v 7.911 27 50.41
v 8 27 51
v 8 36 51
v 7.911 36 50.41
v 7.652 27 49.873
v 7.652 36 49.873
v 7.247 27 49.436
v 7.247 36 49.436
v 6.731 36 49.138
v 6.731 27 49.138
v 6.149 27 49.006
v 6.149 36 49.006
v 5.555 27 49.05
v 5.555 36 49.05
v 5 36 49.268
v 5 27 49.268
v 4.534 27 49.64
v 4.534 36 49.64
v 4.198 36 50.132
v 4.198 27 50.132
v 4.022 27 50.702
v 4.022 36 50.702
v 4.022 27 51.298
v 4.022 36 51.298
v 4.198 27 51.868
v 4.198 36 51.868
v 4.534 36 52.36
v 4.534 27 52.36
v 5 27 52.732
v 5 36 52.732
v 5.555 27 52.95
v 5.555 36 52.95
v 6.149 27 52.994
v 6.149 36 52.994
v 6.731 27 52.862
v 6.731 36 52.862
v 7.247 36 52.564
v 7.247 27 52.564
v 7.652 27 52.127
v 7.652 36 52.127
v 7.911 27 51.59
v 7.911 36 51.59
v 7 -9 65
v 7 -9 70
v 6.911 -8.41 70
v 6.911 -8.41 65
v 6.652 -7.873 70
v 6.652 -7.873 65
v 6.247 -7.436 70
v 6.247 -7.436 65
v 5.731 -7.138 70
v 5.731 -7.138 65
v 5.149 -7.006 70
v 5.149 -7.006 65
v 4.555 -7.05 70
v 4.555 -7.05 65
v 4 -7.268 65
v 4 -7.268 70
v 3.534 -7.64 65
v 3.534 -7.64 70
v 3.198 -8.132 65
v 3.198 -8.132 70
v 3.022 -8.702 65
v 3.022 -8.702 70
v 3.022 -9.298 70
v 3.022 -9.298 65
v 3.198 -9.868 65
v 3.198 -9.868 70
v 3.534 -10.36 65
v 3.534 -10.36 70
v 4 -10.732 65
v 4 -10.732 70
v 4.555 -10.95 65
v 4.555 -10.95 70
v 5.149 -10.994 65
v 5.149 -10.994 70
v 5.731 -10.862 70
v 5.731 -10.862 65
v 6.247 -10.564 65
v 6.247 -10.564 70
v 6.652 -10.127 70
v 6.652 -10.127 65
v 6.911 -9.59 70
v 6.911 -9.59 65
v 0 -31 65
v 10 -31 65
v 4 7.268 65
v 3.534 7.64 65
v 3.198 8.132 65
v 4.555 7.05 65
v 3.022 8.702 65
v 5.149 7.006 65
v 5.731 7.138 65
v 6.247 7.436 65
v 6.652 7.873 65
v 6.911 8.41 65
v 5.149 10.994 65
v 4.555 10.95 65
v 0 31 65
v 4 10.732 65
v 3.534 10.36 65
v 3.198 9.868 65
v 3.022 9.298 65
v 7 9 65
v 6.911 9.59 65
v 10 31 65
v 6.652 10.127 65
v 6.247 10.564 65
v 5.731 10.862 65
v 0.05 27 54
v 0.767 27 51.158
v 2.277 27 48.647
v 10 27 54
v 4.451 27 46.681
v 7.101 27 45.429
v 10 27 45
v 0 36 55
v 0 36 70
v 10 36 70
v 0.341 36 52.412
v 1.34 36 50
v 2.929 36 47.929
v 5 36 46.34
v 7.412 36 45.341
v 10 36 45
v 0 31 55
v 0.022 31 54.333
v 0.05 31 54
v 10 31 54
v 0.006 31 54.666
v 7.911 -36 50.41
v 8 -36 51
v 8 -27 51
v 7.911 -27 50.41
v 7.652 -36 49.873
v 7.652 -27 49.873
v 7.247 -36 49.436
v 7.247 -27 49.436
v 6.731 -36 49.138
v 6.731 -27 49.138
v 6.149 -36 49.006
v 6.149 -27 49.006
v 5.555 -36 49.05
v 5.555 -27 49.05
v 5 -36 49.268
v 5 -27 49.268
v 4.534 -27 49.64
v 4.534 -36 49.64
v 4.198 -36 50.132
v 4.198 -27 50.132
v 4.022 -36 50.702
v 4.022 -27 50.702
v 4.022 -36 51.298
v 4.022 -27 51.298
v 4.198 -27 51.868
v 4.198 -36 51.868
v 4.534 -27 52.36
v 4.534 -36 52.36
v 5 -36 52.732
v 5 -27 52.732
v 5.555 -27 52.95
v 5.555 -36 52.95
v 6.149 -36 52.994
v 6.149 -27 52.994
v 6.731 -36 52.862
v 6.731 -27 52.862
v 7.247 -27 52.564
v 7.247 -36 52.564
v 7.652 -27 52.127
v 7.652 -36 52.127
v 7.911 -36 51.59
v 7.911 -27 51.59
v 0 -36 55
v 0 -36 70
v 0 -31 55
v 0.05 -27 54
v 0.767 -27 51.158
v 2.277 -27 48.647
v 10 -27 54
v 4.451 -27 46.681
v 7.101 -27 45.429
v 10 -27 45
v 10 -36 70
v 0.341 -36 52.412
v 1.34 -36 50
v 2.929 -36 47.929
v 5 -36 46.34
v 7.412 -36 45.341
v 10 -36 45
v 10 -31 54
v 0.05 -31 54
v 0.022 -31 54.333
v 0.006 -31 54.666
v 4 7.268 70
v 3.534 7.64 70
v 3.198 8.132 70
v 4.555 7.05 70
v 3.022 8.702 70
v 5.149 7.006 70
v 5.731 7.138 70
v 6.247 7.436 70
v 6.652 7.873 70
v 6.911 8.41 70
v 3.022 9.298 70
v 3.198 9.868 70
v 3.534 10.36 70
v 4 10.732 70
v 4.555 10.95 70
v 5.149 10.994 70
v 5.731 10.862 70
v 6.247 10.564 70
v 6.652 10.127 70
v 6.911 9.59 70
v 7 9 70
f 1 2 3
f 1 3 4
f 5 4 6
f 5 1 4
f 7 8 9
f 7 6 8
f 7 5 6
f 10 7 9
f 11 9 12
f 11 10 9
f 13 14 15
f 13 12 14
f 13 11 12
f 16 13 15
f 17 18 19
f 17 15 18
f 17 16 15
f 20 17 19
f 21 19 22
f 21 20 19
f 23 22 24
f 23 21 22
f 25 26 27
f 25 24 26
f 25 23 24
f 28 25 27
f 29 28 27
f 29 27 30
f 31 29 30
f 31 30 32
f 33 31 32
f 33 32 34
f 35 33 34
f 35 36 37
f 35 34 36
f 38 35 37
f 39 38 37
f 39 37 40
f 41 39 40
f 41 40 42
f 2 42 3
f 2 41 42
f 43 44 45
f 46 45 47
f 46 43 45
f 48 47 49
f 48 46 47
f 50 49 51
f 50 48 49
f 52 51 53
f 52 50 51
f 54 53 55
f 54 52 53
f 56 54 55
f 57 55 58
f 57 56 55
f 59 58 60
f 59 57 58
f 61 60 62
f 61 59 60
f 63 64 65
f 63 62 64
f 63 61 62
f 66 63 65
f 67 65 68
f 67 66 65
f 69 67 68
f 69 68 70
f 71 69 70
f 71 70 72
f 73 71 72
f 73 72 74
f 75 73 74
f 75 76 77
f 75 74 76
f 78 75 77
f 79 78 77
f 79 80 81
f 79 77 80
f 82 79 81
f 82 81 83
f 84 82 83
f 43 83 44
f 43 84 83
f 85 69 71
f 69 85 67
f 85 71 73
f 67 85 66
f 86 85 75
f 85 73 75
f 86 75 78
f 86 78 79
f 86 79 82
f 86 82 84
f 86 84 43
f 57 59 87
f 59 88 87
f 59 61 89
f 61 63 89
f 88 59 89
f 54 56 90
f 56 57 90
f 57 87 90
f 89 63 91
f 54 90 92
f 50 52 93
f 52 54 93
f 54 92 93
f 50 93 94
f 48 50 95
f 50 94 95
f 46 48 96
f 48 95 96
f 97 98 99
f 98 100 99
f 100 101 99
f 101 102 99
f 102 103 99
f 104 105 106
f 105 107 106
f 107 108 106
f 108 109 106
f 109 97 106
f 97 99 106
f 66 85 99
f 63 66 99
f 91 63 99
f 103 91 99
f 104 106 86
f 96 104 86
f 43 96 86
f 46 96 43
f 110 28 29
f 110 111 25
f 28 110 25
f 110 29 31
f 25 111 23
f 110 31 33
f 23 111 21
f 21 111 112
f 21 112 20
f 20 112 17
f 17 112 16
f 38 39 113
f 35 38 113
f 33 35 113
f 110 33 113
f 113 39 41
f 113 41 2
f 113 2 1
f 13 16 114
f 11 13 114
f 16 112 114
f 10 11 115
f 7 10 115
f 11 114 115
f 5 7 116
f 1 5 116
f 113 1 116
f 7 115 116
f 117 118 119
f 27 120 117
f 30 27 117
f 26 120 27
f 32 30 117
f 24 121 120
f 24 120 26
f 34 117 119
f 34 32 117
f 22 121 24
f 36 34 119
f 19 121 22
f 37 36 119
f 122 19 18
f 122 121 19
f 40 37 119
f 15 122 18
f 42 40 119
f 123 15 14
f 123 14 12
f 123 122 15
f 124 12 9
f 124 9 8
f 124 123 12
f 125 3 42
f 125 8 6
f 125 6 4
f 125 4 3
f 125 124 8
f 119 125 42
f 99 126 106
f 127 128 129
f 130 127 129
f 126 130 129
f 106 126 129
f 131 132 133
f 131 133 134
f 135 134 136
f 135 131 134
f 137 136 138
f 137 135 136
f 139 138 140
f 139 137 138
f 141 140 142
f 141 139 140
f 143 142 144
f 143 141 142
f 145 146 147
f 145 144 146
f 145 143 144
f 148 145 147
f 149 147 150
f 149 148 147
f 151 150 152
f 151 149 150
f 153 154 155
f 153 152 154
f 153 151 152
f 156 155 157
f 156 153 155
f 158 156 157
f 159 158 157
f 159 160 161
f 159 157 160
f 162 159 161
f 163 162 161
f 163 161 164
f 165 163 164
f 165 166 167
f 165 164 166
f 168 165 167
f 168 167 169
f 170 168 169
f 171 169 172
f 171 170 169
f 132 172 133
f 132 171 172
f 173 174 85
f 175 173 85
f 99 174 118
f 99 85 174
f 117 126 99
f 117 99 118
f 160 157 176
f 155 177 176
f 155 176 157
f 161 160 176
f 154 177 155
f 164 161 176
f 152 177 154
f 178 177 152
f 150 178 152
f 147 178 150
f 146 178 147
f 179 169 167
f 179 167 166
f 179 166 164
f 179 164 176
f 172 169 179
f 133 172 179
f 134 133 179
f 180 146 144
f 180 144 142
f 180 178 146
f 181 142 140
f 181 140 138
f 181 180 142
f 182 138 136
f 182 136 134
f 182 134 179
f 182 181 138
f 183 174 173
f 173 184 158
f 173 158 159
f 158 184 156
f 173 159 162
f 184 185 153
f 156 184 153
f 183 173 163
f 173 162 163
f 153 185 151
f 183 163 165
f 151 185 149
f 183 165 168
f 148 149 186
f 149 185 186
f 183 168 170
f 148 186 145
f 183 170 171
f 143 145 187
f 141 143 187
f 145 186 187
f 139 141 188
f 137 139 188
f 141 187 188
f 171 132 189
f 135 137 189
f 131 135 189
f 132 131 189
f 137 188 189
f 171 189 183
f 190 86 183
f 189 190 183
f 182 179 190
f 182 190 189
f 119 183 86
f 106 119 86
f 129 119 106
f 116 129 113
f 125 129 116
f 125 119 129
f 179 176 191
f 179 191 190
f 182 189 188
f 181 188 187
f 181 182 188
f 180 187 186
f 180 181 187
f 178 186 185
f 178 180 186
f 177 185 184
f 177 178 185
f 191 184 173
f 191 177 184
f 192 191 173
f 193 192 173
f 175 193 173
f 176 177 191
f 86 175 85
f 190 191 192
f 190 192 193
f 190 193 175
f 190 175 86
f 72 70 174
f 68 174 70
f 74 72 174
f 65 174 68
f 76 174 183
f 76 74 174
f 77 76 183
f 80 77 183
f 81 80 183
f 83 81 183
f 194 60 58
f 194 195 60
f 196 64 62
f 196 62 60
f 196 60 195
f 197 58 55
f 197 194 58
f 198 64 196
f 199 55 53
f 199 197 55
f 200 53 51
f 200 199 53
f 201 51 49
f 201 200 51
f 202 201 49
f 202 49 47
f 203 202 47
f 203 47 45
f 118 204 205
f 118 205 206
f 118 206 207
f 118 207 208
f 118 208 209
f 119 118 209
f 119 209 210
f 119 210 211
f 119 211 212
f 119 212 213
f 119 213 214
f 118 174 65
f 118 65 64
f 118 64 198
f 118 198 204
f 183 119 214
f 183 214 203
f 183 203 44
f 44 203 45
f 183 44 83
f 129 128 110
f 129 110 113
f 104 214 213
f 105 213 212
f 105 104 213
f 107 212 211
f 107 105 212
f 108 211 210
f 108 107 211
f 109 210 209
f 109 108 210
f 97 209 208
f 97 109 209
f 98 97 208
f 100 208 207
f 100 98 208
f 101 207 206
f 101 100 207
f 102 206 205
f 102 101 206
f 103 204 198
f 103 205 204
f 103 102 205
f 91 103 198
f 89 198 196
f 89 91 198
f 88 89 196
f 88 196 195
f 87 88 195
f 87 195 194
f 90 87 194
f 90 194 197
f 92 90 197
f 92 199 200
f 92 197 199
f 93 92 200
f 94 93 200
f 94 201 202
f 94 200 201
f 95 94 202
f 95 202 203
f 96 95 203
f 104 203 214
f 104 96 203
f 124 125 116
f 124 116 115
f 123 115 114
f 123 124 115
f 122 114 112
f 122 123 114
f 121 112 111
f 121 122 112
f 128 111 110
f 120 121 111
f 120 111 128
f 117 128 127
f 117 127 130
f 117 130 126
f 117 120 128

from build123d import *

# Parameters (mm, degrees)
CYLINDER016_R     = 2
CYLINDER016_DEPTH = 94
CYLINDER030_R     = 2
CYLINDER030_DEPTH = 10
CYLINDER029_R     = 2
CYLINDER029_DEPTH = 10
CYLINDER001_W     = 10
CYLINDER001_H     = 5
CYLINDER001_ANGLE = 90
BOX002_W          = 10
BOX002_H          = 54
BOX002_DEPTH      = 11
BOX001_W          = 10
BOX001_H          = 62
BOX001_DEPTH      = 11
BOX_W             = 10
BOX_H             = 72
BOX_DEPTH         = 25
CYLINDER_W        = 10
CYLINDER_H        = 5
CYLINDER_ANGLE    = 90
CYLINDER017_W     = 10
CYLINDER017_H     = 87
CYLINDER017_ANGLE = 90
BOX004_W          = 25
BOX004_H          = 72
BOX004_DEPTH      = 15


with BuildPart() as m3heastsetcut:
    # Cylinder016 → Cylinder016 (new body)
    with BuildSketch(Plane(origin=(6, -47.35, 51), x_dir=(1, 0, 0), z_dir=(0, 1, 0))):
        Circle(CYLINDER016_R)
    extrude(amount=CYLINDER016_DEPTH)


with BuildPart() as m3cuts003:
    # Cylinder030 → Cylinder030 (new body)
    with BuildSketch(Plane(origin=(5, 9, 70), x_dir=(1, 0, 0), z_dir=(0, 0, 1))):
        Circle(CYLINDER030_R)
    extrude(amount=CYLINDER030_DEPTH)


with BuildPart() as m3cute001:
    # Cylinder029 → Cylinder029 (new body)
    with BuildSketch(Plane(origin=(5, -9, 70), x_dir=(1, 0, 0), z_dir=(0, 0, 1))):
        Circle(CYLINDER029_R)
    extrude(amount=CYLINDER029_DEPTH)

    # Fusion012: union m3Cuts003
    add(m3cuts003.part)


with BuildPart() as m3cute001_1:
    # Fusion012 placement: moved
    add(m3cute001.part.moved(Location((0, 0, -5))))


with BuildPart() as cylinder001:
    # Cylinder001 → Cylinder001 (revolve)
    with BuildSketch(Plane(origin=(10, -31, 55), x_dir=(-1, 0, 0), z_dir=(0, 0, 1))):
        with Locations((5, 2.5)):
            Rectangle(CYLINDER001_W, CYLINDER001_H)
    revolve(axis=Axis((10, -31, 55), (0, -1, 0)), revolution_arc=CYLINDER001_ANGLE)


with BuildPart() as in001:
    # Box002 → Box002 (new body)
    with BuildSketch(Plane(origin=(0, -27, 45), x_dir=(1, 0, 0), z_dir=(0, 0, 1))):
        with Locations((5, 27)):
            Rectangle(BOX002_W, BOX002_H)
    extrude(amount=BOX002_DEPTH)


with BuildPart() as in002:
    # Box001 → Box001 (new body)
    with BuildSketch(Plane(origin=(0, -31, 54), x_dir=(1, 0, 0), z_dir=(0, 0, 1))):
        with Locations((5, 31)):
            Rectangle(BOX001_W, BOX001_H)
    extrude(amount=BOX001_DEPTH)

    # Fusion: union in001
    add(in001.part)


with BuildPart() as cut:
    # Box → Box (new body)
    with BuildSketch(Plane(origin=(0, -36, 45), x_dir=(1, 0, 0), z_dir=(0, 0, 1))):
        with Locations((5, 36)):
            Rectangle(BOX_W, BOX_H)
    extrude(amount=BOX_DEPTH)

    # Cut: cut in002
    add(in002.part, mode=Mode.SUBTRACT)


with BuildPart() as lowbase:
    # Cylinder → Cylinder (revolve)
    with BuildSketch(Plane(origin=(10, 31, 55), x_dir=(0, 0, -1), z_dir=(1, 0, 0))):
        with Locations((5, 2.5)):
            Rectangle(CYLINDER_W, CYLINDER_H)
    revolve(axis=Axis((10, 31, 55), (0, 1, 0)), revolution_arc=CYLINDER_ANGLE)

    # Fusion001: union Cylinder001, Cut
    add(cylinder001.part)
    add(cut.part)

    # Cut003: cut m3Cute001
    add(m3cute001_1.part, mode=Mode.SUBTRACT)

    # Cut004: cut m3HeastSetCut
    add(m3heastsetcut.part, mode=Mode.SUBTRACT)


with BuildPart() as include001:
    # Cylinder017 → Cylinder017 (revolve)
    with BuildSketch(Plane(origin=(10, -40.75, 55), x_dir=(0, 0, -1), z_dir=(1, 0, 0))):
        with Locations((5, 43.5)):
            Rectangle(CYLINDER017_W, CYLINDER017_H)
    revolve(axis=Axis((10, -40.75, 55), (0, 1, 0)), revolution_arc=CYLINDER017_ANGLE)


with BuildPart() as common:
    # Box004 → Box004 (new body)
    with BuildSketch(Plane(origin=(-15, -36, 55), x_dir=(1, 0, 0), z_dir=(0, 0, 1))):
        with Locations((12.5, 36)):
            Rectangle(BOX004_W, BOX004_H)
    extrude(amount=BOX004_DEPTH)

    # Fusion014: union include001
    add(include001.part)

    # Common: intersect lowBase
    add(lowbase.part, mode=Mode.INTERSECT)


solid = common.part
